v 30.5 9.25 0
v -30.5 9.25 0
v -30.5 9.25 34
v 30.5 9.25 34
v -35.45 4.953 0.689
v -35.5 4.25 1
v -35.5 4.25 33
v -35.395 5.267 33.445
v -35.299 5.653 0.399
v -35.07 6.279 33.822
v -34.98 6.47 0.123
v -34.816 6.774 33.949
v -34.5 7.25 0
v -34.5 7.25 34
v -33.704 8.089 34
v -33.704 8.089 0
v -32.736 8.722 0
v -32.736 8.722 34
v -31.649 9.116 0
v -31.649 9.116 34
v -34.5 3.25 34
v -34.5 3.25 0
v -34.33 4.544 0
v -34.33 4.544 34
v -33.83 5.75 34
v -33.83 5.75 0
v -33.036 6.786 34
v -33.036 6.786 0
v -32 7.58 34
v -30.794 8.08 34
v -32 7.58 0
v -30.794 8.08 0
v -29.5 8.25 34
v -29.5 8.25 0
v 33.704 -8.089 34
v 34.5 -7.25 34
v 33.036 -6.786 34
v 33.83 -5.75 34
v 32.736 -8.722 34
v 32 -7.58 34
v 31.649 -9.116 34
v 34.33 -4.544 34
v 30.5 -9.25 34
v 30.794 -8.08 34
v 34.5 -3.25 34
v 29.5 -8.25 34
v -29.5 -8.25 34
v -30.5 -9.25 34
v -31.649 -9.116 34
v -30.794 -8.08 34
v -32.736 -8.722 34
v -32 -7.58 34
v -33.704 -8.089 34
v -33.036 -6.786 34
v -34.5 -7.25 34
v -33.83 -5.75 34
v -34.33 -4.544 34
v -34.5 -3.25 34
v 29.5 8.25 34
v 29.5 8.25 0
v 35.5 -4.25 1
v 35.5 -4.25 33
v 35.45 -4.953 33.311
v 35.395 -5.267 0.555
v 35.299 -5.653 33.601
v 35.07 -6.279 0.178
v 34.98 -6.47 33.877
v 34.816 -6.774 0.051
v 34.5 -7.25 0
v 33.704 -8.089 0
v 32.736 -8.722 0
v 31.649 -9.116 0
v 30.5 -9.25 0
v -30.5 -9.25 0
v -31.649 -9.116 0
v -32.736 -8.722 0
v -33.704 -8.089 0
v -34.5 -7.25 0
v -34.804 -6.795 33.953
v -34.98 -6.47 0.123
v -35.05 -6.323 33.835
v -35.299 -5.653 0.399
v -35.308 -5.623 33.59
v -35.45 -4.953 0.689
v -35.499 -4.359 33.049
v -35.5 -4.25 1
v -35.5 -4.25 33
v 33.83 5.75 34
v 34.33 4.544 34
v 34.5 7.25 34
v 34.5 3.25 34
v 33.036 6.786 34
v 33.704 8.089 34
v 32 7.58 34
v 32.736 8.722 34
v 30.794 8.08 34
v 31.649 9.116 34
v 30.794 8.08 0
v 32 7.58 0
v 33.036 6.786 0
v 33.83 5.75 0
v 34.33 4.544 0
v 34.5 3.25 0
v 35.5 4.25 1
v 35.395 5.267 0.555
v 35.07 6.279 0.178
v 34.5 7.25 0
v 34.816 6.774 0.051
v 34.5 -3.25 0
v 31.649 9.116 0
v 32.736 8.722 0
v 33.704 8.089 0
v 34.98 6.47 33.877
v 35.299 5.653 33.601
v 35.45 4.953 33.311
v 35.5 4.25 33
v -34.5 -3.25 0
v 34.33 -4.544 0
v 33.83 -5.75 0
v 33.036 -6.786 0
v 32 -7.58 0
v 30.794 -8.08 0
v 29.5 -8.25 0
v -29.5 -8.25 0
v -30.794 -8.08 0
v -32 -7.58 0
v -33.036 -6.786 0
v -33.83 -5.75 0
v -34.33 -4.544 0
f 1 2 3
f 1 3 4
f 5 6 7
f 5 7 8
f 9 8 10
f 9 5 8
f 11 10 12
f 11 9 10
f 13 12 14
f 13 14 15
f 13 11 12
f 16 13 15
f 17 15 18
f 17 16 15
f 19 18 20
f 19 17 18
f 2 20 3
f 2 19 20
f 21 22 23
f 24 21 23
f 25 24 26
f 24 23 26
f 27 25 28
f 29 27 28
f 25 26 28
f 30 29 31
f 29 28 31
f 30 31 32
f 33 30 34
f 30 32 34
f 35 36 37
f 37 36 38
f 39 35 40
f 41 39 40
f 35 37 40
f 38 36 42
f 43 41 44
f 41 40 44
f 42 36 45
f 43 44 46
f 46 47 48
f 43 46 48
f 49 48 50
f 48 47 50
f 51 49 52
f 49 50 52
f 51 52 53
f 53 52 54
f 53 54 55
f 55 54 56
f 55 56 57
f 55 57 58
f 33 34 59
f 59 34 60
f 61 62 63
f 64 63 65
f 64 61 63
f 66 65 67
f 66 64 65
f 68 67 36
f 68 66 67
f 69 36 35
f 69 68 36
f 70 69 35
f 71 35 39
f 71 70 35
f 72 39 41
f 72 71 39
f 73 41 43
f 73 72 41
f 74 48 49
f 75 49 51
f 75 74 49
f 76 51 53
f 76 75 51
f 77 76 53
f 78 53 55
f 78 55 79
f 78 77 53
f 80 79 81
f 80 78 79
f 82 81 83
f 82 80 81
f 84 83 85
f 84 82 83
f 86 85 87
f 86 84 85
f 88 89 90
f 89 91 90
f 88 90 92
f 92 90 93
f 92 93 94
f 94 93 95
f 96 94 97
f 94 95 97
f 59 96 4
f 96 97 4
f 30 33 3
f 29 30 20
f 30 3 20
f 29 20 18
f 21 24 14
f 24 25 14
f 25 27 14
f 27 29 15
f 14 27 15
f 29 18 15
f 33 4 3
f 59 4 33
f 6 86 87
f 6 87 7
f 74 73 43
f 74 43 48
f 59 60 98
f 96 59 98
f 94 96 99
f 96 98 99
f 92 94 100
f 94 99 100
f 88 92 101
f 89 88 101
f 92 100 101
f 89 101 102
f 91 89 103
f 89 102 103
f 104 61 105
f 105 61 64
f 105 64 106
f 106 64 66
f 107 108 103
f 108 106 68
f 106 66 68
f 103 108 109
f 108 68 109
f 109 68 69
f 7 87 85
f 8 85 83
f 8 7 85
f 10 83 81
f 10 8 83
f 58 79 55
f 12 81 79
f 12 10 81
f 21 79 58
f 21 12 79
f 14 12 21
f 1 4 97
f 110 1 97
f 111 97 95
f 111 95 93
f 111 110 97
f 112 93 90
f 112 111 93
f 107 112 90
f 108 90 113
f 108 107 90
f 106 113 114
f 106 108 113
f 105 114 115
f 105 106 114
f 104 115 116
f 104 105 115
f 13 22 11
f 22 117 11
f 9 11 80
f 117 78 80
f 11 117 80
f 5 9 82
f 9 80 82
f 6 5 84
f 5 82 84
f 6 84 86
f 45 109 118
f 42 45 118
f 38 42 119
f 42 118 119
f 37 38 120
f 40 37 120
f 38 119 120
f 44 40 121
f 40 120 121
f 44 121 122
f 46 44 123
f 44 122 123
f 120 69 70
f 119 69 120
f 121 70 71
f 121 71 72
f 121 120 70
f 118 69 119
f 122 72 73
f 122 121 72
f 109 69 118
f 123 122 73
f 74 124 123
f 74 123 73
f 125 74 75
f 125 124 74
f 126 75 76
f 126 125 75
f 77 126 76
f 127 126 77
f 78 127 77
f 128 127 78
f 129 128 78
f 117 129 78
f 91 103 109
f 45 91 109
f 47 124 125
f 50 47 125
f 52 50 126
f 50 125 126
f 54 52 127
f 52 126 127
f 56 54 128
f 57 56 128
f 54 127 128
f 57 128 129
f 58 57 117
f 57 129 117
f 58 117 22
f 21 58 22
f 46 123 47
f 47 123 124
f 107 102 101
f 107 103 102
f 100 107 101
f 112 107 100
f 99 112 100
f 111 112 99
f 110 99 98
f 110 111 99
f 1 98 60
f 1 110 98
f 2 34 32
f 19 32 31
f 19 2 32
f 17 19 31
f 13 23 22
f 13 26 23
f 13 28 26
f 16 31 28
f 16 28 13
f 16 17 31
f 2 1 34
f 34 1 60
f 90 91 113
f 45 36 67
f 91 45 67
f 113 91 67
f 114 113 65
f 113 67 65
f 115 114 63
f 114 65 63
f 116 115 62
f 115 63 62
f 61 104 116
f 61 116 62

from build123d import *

# Parameters (mm, degrees)
BOSS_EXTRUDE3_DEPTH = 34
CUT_EXTRUDE4_DEPTH  = 17


with BuildPart() as part:
    # Sketch12 → Boss-Extrude3 (new body)
    with BuildSketch(Plane.XY):
        with BuildLine():
            Line((30.5, -9.25), (-30.5, -9.25))
            ThreePointArc((-30.5, -9.25), (-34.035533906, -7.785533906), (-35.5, -4.25))
            Line((-35.5, -4.25), (-35.5, 4.25))
            ThreePointArc((-35.5, 4.25), (-34.035533906, 7.785533906), (-30.5, 9.25))
            Line((-30.5, 9.25), (30.5, 9.25))
            ThreePointArc((30.5, 9.25), (34.035533906, 7.785533906), (35.5, 4.25))
            Line((35.5, 4.25), (35.5, -4.25))
            ThreePointArc((35.5, -4.25), (34.035533906, -7.785533906), (30.5, -9.25))
        make_face()
        with BuildLine():
            Line((29.5, -8.25), (-29.5, -8.25))
            ThreePointArc((-29.5, -8.25), (-33.035533906, -6.785533906), (-34.5, -3.25))
            Line((-34.5, -3.25), (-34.5, 3.25))
            ThreePointArc((-34.5, 3.25), (-33.035533906, 6.785533906), (-29.5, 8.25))
            Line((-29.5, 8.25), (29.5, 8.25))
            ThreePointArc((29.5, 8.25), (33.035533906, 6.785533906), (34.5, 3.25))
            Line((34.5, 3.25), (34.5, -3.25))
            ThreePointArc((34.5, -3.25), (33.035533906, -6.785533906), (29.5, -8.25))
        make_face(mode=Mode.SUBTRACT)
    extrude(amount=BOSS_EXTRUDE3_DEPTH)

    # Sketch14 → Cut-Extrude4 (cut, symmetric)
    with BuildSketch(Plane(origin=(0, 0, 0), x_dir=(1, 0, 0), z_dir=(0, 1, 0))):
        with BuildLine():
            ThreePointArc((-34.5, 0), (-35.207106781, -0.292893219), (-35.5, -1))
            Line((-35.5, -1), (-35.5, 0))
            Line((-35.5, 0), (-34.5, 0))
        make_face()
        with BuildLine():
            Line((34.5, 0), (35.5, 0))
            Line((35.5, 0), (35.5, -1))
            ThreePointArc((35.5, -1), (35.207106781, -0.292893219), (34.5, 0))
        make_face()
        with BuildLine():
            ThreePointArc((34.5, -34), (35.207106781, -33.707106781), (35.5, -33))
            Line((35.5, -33), (35.5, -34))
            Line((35.5, -34), (34.5, -34))
        make_face()
        with BuildLine():
            ThreePointArc((-35.5, -33), (-35.207106781, -33.707106781), (-34.5, -34))
            Line((-34.5, -34), (-35.5, -34))
            Line((-35.5, -34), (-35.5, -33))
        make_face()
    extrude(amount=CUT_EXTRUDE4_DEPTH, both=True, mode=Mode.SUBTRACT)


solid = part.part
